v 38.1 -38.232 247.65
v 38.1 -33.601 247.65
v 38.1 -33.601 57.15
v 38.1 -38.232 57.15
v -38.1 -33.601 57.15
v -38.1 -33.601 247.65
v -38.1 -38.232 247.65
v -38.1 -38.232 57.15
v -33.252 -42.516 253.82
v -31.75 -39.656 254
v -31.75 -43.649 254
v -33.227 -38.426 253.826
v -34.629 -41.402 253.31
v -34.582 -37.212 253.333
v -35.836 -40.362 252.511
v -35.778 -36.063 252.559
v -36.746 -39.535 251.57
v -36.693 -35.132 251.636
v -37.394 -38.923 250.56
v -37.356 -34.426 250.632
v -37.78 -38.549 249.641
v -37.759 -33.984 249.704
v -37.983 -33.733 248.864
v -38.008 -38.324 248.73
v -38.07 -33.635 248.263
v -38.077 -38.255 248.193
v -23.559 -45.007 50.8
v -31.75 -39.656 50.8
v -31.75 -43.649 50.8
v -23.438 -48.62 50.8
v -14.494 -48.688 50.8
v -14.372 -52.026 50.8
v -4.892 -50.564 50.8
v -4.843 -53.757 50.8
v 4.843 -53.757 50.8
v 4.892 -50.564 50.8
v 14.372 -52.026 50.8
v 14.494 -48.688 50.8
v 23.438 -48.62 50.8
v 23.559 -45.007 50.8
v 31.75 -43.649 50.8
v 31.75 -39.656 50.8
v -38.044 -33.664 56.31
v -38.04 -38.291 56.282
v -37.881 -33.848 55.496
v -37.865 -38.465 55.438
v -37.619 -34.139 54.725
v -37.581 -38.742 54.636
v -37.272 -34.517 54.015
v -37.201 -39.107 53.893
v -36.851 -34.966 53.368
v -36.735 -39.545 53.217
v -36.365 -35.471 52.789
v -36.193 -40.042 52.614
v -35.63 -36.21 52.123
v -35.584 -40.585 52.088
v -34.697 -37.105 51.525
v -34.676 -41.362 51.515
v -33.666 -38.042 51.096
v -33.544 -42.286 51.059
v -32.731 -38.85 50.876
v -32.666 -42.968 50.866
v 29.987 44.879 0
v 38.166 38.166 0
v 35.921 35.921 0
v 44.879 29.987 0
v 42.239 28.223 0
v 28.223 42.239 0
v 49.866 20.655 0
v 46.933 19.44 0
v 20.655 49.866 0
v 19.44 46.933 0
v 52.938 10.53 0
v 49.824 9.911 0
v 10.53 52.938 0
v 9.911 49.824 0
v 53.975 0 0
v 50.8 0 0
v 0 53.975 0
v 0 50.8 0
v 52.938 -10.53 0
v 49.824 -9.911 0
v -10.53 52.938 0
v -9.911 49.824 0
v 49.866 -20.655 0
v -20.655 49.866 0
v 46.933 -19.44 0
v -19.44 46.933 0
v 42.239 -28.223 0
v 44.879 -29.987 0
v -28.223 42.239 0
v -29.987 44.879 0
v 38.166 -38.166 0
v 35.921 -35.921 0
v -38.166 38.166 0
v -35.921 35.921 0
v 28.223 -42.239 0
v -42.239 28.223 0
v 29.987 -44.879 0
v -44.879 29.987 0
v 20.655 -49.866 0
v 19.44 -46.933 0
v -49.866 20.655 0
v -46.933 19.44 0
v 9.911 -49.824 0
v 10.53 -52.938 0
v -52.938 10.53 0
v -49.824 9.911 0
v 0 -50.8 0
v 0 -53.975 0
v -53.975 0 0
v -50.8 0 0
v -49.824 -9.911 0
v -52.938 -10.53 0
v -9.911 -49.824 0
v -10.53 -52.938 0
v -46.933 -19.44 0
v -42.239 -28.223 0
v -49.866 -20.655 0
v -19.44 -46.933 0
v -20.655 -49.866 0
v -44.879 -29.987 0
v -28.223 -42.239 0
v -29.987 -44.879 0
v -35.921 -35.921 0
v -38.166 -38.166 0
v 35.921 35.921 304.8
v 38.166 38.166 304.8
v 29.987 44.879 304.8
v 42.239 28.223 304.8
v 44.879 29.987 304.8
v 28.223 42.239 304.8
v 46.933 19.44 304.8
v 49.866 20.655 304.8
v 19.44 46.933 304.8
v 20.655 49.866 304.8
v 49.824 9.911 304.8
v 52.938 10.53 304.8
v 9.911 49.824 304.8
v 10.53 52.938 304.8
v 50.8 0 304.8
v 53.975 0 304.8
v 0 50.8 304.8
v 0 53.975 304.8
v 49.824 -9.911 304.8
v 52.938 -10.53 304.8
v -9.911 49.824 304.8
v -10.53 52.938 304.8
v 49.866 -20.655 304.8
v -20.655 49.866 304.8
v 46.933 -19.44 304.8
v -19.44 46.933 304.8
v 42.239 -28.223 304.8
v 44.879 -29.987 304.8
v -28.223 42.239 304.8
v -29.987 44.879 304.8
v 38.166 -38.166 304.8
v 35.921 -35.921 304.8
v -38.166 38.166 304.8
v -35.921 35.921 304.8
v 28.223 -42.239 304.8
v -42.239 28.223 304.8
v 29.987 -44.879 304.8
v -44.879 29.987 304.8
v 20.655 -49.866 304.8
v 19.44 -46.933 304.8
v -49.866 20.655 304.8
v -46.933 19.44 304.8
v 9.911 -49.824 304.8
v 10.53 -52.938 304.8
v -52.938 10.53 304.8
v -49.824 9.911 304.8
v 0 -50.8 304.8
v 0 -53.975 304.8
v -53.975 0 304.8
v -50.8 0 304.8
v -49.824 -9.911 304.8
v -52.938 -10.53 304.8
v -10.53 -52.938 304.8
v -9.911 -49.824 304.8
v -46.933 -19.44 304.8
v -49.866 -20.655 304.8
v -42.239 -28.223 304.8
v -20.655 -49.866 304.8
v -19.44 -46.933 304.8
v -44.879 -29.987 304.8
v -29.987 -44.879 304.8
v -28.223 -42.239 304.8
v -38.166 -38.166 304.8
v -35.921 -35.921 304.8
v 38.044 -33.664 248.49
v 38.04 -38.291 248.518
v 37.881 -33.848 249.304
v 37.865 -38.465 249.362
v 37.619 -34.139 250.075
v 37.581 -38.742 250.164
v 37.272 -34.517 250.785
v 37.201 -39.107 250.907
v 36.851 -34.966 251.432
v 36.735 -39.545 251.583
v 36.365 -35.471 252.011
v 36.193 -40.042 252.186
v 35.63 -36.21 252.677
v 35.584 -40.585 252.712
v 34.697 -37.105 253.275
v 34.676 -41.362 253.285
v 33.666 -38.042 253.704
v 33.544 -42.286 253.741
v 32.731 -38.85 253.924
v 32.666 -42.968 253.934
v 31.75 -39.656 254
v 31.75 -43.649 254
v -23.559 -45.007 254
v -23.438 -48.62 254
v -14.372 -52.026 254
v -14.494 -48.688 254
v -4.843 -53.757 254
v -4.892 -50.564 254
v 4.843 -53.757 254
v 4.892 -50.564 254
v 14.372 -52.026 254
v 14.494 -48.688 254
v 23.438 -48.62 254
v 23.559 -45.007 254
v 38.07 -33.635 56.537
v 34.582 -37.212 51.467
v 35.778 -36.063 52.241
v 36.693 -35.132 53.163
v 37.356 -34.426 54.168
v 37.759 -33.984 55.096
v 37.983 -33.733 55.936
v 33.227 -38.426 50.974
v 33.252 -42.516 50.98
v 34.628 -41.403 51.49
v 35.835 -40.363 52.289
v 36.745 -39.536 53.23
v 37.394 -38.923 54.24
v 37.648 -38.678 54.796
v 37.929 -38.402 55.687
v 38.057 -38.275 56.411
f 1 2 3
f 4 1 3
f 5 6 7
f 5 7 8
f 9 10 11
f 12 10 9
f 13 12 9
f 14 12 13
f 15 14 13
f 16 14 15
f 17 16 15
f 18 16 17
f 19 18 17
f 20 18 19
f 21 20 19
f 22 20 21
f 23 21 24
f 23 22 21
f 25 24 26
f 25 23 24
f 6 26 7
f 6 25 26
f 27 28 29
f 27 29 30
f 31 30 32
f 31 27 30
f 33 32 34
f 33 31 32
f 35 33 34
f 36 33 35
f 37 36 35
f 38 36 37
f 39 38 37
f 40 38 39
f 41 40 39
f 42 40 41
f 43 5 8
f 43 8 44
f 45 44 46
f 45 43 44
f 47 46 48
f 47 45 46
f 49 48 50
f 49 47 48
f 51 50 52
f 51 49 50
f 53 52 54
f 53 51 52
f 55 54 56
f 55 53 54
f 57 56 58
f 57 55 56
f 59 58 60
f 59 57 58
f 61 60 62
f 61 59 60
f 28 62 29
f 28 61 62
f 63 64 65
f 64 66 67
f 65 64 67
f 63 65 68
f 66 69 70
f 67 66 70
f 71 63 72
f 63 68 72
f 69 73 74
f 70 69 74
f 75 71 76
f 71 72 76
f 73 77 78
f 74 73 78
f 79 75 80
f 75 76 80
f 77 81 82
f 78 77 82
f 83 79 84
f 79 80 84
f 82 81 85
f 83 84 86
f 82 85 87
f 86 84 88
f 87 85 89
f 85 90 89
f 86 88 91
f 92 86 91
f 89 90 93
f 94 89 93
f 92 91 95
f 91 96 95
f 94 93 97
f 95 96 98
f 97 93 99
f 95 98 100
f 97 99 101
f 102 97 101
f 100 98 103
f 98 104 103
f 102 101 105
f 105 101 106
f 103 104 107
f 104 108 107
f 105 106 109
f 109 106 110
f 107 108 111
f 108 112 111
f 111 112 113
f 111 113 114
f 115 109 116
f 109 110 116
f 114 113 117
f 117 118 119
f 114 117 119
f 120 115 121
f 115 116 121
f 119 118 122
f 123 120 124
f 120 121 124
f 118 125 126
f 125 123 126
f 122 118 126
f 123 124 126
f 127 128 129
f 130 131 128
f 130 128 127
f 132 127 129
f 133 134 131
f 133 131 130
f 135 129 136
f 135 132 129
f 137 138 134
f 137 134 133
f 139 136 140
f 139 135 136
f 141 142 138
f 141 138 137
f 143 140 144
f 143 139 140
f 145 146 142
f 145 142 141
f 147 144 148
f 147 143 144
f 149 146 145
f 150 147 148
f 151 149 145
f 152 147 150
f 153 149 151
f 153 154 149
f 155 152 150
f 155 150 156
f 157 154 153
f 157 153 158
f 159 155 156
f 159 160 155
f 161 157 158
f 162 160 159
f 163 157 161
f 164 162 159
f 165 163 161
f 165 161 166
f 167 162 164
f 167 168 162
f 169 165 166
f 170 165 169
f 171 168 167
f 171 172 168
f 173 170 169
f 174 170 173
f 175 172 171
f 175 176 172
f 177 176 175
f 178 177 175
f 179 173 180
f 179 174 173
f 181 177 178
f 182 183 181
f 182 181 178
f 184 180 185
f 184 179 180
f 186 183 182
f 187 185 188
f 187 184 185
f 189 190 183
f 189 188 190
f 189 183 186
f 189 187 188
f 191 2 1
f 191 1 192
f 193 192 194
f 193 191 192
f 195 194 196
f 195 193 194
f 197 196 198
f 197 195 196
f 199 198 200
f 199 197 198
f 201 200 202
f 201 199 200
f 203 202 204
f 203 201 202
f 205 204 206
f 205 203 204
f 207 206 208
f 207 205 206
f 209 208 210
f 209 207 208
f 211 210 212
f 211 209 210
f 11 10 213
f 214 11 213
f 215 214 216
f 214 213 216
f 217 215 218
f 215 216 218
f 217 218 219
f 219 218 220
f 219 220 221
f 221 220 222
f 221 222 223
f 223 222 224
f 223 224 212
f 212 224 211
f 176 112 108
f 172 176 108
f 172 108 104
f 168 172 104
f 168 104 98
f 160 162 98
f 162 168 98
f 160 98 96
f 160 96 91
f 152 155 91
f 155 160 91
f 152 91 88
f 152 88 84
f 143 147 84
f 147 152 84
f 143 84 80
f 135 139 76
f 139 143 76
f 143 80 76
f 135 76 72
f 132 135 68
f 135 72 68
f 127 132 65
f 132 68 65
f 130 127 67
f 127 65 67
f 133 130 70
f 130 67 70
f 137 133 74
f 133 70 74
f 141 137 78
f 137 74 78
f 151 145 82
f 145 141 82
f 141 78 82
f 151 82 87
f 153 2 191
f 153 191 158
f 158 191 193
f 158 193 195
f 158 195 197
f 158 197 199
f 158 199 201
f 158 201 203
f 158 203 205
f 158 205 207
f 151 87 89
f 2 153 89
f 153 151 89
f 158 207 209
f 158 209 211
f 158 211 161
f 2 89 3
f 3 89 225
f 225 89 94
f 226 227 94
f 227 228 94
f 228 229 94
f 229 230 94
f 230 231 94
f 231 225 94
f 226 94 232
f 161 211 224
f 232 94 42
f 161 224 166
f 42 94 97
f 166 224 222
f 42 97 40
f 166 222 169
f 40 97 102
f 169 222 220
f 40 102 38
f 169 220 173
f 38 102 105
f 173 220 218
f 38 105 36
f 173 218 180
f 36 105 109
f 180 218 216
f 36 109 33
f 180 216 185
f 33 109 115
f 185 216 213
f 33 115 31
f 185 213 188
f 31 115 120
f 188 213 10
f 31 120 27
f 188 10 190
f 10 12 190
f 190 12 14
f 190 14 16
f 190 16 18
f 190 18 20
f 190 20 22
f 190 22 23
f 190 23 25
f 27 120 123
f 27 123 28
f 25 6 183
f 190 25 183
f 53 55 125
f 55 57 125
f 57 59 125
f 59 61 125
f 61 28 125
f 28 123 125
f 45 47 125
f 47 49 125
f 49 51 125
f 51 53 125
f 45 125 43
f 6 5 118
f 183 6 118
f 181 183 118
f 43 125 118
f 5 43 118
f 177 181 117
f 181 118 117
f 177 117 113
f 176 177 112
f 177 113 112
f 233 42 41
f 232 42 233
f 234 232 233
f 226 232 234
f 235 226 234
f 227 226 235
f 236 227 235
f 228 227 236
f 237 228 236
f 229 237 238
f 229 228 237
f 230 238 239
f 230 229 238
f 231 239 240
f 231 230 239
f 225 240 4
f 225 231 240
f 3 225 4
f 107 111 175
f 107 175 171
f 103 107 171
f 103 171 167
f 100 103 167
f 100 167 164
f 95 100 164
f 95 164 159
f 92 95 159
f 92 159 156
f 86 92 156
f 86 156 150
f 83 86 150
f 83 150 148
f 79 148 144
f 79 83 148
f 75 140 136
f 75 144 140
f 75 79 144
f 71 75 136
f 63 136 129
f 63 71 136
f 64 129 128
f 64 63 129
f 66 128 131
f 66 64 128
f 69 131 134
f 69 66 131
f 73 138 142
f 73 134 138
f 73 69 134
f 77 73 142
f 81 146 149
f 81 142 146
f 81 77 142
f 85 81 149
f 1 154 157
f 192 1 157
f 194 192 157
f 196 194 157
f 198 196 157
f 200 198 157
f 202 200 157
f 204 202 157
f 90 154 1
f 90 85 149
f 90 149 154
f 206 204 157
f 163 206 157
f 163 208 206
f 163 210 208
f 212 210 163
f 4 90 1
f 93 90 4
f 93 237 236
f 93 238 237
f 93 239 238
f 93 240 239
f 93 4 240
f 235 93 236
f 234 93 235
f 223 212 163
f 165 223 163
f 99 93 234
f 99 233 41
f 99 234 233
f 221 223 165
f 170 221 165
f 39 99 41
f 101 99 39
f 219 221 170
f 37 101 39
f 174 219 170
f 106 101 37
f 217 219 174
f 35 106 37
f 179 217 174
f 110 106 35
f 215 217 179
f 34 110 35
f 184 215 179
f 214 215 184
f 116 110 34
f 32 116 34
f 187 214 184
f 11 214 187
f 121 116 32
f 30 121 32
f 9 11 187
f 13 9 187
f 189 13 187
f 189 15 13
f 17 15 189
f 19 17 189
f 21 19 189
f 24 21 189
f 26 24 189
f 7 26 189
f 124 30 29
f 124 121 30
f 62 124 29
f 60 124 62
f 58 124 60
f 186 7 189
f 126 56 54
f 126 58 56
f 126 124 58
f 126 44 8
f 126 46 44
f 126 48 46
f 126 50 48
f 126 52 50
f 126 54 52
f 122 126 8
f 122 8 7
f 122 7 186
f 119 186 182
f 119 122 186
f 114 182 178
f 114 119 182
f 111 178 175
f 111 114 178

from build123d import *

# Parameters (mm, degrees)
SKETCH1_R      = 53.975
SKETCH1_R_2    = 50.8
EXTRUDE1_DEPTH = 304.8
SKETCH2_W      = 76.2
SKETCH2_H      = 203.2
EXTRUDE2_DEPTH = 315.212732476
FILLET1_R      = 6.35


with BuildPart() as part:
    # Sketch1 → Extrude1 (new body)
    with BuildSketch(Plane.XY):
        with Locations(Location((0, 0, 0), (0, 0, 180))):
            Circle(SKETCH1_R)
        with Locations(Location((0, 0, 0), (0, 0, 180))):
            Circle(SKETCH1_R_2, mode=Mode.SUBTRACT)
    extrude(amount=EXTRUDE1_DEPTH)

    # Sketch2 → Extrude2 (cut, through all)
    with BuildSketch(Plane(origin=(0, 0, 0), x_dir=(1, 0, 0), z_dir=(0, 1, 0))):
        with Locations((0, -152.4)):
            Rectangle(SKETCH2_W, SKETCH2_H)
    extrude(amount=-EXTRUDE2_DEPTH, mode=Mode.SUBTRACT)

    # Fillet1
    # the kernel refuses this fillet: 6.35 mm, written as the material it adds along each edge
    with BuildSketch(Plane(origin=(-38.1, -17.726041651, 254), x_dir=(0, 0, -1), z_dir=(0, -1, 0))) as fillet1_piece_1_section:
        with BuildLine():
            CenterArc((FILLET1_R, FILLET1_R), FILLET1_R, 180, 90)
            Line((0, FILLET1_R), (0, 0))
            Line((0, 0), (FILLET1_R, 0))
        make_face()
    fillet1_piece_1 = extrude(amount=36.381021137, mode=Mode.PRIVATE)
    fillet1_piece_1 = fillet1_piece_1 & Plane(origin=(0, 0, 252.560306593), x_dir=(-1, 0, 0), z_dir=(0, 0, -1)) * Cylinder(53.975, 99, mode=Mode.PRIVATE)
    fillet1_piece_1 = fillet1_piece_1 - Plane(origin=(0, 0, 252.560306593), x_dir=(-1, 0, 0), z_dir=(0, 0, -1)) * Cylinder(50.8, 99, mode=Mode.PRIVATE)
    add(fillet1_piece_1)
    with BuildSketch(Plane(origin=(-38.1, -17.726041651, 50.8), x_dir=(1, 0, 0), z_dir=(0, -1, 0))) as fillet1_piece_2_section:
        with BuildLine():
            CenterArc((FILLET1_R, FILLET1_R), FILLET1_R, 180, 90)
            Line((0, FILLET1_R), (0, 0))
            Line((0, 0), (FILLET1_R, 0))
        make_face()
    fillet1_piece_2 = extrude(amount=36.381021137, mode=Mode.PRIVATE)
    fillet1_piece_2 = fillet1_piece_2 & Plane(origin=(0, 0, 52.23969466), x_dir=(-1, 0, 0), z_dir=(0, 0, -1)) * Cylinder(53.975, 99, mode=Mode.PRIVATE)
    fillet1_piece_2 = fillet1_piece_2 - Plane(origin=(0, 0, 52.23969466), x_dir=(-1, 0, 0), z_dir=(0, 0, -1)) * Cylinder(50.8, 99, mode=Mode.PRIVATE)
    add(fillet1_piece_2)
    with BuildSketch(Plane(origin=(38.1, -17.726041651, 50.8), x_dir=(-1, 0, 0), z_dir=(0, -1, 0))) as fillet1_piece_3_section:
        with BuildLine():
            CenterArc((FILLET1_R, -FILLET1_R), FILLET1_R, 90, 90)
            Line((0, -FILLET1_R), (0, 0))
            Line((0, 0), (FILLET1_R, 0))
        make_face()
    fillet1_piece_3 = extrude(amount=36.381021137, mode=Mode.PRIVATE)
    fillet1_piece_3 = fillet1_piece_3 & Plane(origin=(0, 0, 52.239693302), x_dir=(-1, 0, 0), z_dir=(0, 0, -1)) * Cylinder(53.975, 99, mode=Mode.PRIVATE)
    fillet1_piece_3 = fillet1_piece_3 - Plane(origin=(0, 0, 52.239693302), x_dir=(-1, 0, 0), z_dir=(0, 0, -1)) * Cylinder(50.8, 99, mode=Mode.PRIVATE)
    add(fillet1_piece_3)
    with BuildSketch(Plane(origin=(38.1, -17.726041651, 254), x_dir=(-1, 0, 0), z_dir=(0, -1, 0))) as fillet1_piece_4_section:
        with BuildLine():
            CenterArc((FILLET1_R, FILLET1_R), FILLET1_R, 180, 90)
            Line((0, FILLET1_R), (0, 0))
            Line((0, 0), (FILLET1_R, 0))
        make_face()
    fillet1_piece_4 = extrude(amount=36.381021137, mode=Mode.PRIVATE)
    fillet1_piece_4 = fillet1_piece_4 & Plane(origin=(0, 0, 252.560306698), x_dir=(-1, 0, 0), z_dir=(0, 0, -1)) * Cylinder(53.975, 99, mode=Mode.PRIVATE)
    fillet1_piece_4 = fillet1_piece_4 - Plane(origin=(0, 0, 252.560306698), x_dir=(-1, 0, 0), z_dir=(0, 0, -1)) * Cylinder(50.8, 99, mode=Mode.PRIVATE)
    add(fillet1_piece_4)


solid = part.part
